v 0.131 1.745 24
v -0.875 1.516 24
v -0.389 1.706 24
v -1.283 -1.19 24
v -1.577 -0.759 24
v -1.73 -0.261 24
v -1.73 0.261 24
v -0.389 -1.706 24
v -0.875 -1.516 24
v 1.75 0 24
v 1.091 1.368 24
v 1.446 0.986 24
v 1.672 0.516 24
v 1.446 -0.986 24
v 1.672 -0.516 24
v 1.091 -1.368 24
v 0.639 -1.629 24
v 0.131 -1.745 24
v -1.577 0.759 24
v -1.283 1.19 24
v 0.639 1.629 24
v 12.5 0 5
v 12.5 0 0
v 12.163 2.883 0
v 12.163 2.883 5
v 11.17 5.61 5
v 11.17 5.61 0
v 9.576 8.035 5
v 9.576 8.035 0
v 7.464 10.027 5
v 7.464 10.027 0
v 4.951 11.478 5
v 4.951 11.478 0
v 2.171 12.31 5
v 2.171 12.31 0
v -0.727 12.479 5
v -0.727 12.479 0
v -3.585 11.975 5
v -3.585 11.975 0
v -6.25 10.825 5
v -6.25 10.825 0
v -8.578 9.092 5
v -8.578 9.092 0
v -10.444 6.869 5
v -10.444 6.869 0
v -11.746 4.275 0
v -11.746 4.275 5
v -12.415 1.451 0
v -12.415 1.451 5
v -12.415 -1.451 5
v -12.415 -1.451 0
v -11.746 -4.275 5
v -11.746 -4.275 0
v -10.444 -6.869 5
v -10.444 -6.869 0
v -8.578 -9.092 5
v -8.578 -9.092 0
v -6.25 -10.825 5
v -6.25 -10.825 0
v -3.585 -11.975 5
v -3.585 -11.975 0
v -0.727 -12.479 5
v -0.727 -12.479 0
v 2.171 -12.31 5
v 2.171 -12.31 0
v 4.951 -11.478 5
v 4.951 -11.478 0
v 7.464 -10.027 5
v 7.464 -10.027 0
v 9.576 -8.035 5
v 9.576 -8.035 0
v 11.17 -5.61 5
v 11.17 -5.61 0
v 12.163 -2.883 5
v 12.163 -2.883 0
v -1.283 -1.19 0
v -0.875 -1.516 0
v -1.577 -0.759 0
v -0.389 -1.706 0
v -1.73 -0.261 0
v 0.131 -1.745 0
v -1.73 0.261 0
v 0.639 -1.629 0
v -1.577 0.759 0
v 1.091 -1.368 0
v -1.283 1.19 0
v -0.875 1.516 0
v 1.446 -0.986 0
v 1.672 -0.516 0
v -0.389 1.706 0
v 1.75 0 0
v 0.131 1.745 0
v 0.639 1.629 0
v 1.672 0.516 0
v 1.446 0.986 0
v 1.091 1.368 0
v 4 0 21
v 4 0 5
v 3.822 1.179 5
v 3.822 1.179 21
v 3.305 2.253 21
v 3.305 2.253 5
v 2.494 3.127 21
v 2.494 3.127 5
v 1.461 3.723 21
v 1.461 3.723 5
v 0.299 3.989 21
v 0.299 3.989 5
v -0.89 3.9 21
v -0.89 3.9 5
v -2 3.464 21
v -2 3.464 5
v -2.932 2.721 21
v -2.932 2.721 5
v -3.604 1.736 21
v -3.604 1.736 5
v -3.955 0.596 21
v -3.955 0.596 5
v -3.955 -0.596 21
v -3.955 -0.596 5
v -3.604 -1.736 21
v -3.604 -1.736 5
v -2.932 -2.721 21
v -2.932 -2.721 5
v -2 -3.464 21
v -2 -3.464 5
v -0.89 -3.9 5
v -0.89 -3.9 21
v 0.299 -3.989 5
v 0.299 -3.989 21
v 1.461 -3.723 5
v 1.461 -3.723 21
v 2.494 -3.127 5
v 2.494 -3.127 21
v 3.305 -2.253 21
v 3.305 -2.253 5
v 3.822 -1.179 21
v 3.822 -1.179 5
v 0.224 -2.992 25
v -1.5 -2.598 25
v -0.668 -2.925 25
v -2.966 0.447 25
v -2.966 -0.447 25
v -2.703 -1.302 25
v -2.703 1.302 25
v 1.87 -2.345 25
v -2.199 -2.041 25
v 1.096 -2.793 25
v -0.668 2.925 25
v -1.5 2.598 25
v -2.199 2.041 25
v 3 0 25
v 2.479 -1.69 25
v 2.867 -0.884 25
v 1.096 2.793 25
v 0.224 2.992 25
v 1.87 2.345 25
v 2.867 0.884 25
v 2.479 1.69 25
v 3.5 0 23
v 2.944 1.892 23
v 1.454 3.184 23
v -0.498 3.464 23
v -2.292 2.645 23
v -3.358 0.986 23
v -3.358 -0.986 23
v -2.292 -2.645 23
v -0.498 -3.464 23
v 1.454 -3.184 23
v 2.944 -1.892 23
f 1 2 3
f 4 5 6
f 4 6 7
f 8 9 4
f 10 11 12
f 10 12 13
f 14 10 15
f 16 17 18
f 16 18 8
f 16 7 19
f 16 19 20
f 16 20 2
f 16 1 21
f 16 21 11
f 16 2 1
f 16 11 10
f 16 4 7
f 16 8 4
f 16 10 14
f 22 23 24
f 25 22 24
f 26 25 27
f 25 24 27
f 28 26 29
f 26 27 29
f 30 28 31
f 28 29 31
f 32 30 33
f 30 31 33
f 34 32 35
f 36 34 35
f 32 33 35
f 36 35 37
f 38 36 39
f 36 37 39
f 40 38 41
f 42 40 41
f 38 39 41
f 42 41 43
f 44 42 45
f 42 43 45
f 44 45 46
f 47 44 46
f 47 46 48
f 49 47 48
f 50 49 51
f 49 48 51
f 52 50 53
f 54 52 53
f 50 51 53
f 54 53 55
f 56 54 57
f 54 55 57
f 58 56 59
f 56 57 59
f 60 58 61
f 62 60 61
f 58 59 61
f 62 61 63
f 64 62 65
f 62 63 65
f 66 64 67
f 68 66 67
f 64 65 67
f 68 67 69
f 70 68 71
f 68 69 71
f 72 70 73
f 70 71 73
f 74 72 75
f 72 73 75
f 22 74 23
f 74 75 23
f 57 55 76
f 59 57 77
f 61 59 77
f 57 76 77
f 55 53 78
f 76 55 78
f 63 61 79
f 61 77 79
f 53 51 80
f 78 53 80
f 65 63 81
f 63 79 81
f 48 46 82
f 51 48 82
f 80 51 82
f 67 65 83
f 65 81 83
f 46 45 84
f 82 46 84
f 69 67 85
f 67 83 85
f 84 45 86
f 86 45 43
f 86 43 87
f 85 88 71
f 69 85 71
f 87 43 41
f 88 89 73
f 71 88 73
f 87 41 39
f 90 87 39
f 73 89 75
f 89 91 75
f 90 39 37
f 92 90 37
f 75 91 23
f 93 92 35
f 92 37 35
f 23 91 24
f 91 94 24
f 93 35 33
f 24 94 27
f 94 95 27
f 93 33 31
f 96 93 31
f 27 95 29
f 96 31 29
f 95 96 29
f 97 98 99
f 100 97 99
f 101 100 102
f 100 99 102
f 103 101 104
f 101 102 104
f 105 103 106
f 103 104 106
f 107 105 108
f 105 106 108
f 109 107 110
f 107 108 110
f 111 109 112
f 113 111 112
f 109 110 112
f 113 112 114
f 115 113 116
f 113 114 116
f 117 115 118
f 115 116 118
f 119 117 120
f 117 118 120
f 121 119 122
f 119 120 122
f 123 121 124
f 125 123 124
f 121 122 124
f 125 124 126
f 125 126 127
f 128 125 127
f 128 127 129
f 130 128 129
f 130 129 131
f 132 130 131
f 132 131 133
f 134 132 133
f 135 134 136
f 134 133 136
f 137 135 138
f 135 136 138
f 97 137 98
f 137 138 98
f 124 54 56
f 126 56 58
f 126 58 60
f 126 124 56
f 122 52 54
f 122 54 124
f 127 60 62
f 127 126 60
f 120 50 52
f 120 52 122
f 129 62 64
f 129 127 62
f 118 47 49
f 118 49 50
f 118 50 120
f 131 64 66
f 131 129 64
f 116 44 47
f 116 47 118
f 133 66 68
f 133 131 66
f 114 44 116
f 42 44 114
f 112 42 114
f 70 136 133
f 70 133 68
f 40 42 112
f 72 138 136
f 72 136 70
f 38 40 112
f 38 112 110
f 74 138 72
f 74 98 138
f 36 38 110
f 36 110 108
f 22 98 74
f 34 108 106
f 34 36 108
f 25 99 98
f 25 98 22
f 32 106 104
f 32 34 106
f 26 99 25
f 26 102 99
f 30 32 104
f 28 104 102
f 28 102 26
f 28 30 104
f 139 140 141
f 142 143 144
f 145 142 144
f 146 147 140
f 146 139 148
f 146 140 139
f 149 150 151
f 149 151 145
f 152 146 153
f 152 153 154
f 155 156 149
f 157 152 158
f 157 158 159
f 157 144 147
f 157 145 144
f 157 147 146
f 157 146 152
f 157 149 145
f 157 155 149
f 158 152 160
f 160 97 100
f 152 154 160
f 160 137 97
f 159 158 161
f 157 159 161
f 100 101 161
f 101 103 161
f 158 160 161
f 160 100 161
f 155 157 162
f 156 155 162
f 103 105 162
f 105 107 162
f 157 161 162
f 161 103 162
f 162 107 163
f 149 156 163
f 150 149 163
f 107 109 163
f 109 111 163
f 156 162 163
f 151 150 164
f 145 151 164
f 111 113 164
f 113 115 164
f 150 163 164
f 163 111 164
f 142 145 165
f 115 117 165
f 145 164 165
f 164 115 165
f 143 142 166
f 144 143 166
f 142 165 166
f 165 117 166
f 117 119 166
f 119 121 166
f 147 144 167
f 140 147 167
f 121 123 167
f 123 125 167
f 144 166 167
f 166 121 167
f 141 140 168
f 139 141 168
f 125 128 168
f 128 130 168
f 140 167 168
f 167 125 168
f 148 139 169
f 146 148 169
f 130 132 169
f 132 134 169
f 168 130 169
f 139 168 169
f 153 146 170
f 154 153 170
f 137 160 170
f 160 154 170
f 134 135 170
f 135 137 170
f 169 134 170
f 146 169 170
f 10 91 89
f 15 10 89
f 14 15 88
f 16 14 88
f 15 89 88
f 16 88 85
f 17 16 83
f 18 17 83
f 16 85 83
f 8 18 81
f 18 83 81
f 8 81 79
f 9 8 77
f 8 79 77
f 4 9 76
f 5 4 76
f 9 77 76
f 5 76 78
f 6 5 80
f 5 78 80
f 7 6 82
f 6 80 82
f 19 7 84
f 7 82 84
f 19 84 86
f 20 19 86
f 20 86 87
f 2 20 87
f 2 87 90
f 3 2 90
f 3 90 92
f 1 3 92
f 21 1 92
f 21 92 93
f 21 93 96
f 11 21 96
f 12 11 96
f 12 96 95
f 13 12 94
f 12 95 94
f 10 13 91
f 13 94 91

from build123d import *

# Parameters (mm, degrees)
F0_R     = 12.5
F1_DEPTH = 5
F2_R     = 4
F3_DEPTH = 20
F4_SIZE2 = 4
F4_SIZE  = 1
F5_R     = 1.75
F6_DEPTH = 24


with BuildPart() as f1:
    # F0 (on Top) → F1 (new body)
    with BuildSketch(Plane.XY):
        Circle(F0_R)
    extrude(amount=F1_DEPTH)

    # F2 (on face) → F3 (join)
    with BuildSketch(Plane.XY.offset(5)):
        Circle(F2_R)
    extrude(amount=F3_DEPTH)

    # F4
    f4_edges = [f1.edges().sort_by_distance(p)[0] for p in [
        (-4, 0, 25),
    ]]
    f4_side = f1.faces().sort_by_distance((0, 0, 25))[0]
    chamfer(f4_edges, length=F4_SIZE, length2=F4_SIZE2, reference=f4_side)

    # F5 (on face) → F6 (cut)
    with BuildSketch(Plane(origin=(0, 0, 0), x_dir=(1, 0, 0), z_dir=(0, 0, -1))):
        Circle(F5_R)
    extrude(amount=-F6_DEPTH, mode=Mode.SUBTRACT)


solid = f1.part
